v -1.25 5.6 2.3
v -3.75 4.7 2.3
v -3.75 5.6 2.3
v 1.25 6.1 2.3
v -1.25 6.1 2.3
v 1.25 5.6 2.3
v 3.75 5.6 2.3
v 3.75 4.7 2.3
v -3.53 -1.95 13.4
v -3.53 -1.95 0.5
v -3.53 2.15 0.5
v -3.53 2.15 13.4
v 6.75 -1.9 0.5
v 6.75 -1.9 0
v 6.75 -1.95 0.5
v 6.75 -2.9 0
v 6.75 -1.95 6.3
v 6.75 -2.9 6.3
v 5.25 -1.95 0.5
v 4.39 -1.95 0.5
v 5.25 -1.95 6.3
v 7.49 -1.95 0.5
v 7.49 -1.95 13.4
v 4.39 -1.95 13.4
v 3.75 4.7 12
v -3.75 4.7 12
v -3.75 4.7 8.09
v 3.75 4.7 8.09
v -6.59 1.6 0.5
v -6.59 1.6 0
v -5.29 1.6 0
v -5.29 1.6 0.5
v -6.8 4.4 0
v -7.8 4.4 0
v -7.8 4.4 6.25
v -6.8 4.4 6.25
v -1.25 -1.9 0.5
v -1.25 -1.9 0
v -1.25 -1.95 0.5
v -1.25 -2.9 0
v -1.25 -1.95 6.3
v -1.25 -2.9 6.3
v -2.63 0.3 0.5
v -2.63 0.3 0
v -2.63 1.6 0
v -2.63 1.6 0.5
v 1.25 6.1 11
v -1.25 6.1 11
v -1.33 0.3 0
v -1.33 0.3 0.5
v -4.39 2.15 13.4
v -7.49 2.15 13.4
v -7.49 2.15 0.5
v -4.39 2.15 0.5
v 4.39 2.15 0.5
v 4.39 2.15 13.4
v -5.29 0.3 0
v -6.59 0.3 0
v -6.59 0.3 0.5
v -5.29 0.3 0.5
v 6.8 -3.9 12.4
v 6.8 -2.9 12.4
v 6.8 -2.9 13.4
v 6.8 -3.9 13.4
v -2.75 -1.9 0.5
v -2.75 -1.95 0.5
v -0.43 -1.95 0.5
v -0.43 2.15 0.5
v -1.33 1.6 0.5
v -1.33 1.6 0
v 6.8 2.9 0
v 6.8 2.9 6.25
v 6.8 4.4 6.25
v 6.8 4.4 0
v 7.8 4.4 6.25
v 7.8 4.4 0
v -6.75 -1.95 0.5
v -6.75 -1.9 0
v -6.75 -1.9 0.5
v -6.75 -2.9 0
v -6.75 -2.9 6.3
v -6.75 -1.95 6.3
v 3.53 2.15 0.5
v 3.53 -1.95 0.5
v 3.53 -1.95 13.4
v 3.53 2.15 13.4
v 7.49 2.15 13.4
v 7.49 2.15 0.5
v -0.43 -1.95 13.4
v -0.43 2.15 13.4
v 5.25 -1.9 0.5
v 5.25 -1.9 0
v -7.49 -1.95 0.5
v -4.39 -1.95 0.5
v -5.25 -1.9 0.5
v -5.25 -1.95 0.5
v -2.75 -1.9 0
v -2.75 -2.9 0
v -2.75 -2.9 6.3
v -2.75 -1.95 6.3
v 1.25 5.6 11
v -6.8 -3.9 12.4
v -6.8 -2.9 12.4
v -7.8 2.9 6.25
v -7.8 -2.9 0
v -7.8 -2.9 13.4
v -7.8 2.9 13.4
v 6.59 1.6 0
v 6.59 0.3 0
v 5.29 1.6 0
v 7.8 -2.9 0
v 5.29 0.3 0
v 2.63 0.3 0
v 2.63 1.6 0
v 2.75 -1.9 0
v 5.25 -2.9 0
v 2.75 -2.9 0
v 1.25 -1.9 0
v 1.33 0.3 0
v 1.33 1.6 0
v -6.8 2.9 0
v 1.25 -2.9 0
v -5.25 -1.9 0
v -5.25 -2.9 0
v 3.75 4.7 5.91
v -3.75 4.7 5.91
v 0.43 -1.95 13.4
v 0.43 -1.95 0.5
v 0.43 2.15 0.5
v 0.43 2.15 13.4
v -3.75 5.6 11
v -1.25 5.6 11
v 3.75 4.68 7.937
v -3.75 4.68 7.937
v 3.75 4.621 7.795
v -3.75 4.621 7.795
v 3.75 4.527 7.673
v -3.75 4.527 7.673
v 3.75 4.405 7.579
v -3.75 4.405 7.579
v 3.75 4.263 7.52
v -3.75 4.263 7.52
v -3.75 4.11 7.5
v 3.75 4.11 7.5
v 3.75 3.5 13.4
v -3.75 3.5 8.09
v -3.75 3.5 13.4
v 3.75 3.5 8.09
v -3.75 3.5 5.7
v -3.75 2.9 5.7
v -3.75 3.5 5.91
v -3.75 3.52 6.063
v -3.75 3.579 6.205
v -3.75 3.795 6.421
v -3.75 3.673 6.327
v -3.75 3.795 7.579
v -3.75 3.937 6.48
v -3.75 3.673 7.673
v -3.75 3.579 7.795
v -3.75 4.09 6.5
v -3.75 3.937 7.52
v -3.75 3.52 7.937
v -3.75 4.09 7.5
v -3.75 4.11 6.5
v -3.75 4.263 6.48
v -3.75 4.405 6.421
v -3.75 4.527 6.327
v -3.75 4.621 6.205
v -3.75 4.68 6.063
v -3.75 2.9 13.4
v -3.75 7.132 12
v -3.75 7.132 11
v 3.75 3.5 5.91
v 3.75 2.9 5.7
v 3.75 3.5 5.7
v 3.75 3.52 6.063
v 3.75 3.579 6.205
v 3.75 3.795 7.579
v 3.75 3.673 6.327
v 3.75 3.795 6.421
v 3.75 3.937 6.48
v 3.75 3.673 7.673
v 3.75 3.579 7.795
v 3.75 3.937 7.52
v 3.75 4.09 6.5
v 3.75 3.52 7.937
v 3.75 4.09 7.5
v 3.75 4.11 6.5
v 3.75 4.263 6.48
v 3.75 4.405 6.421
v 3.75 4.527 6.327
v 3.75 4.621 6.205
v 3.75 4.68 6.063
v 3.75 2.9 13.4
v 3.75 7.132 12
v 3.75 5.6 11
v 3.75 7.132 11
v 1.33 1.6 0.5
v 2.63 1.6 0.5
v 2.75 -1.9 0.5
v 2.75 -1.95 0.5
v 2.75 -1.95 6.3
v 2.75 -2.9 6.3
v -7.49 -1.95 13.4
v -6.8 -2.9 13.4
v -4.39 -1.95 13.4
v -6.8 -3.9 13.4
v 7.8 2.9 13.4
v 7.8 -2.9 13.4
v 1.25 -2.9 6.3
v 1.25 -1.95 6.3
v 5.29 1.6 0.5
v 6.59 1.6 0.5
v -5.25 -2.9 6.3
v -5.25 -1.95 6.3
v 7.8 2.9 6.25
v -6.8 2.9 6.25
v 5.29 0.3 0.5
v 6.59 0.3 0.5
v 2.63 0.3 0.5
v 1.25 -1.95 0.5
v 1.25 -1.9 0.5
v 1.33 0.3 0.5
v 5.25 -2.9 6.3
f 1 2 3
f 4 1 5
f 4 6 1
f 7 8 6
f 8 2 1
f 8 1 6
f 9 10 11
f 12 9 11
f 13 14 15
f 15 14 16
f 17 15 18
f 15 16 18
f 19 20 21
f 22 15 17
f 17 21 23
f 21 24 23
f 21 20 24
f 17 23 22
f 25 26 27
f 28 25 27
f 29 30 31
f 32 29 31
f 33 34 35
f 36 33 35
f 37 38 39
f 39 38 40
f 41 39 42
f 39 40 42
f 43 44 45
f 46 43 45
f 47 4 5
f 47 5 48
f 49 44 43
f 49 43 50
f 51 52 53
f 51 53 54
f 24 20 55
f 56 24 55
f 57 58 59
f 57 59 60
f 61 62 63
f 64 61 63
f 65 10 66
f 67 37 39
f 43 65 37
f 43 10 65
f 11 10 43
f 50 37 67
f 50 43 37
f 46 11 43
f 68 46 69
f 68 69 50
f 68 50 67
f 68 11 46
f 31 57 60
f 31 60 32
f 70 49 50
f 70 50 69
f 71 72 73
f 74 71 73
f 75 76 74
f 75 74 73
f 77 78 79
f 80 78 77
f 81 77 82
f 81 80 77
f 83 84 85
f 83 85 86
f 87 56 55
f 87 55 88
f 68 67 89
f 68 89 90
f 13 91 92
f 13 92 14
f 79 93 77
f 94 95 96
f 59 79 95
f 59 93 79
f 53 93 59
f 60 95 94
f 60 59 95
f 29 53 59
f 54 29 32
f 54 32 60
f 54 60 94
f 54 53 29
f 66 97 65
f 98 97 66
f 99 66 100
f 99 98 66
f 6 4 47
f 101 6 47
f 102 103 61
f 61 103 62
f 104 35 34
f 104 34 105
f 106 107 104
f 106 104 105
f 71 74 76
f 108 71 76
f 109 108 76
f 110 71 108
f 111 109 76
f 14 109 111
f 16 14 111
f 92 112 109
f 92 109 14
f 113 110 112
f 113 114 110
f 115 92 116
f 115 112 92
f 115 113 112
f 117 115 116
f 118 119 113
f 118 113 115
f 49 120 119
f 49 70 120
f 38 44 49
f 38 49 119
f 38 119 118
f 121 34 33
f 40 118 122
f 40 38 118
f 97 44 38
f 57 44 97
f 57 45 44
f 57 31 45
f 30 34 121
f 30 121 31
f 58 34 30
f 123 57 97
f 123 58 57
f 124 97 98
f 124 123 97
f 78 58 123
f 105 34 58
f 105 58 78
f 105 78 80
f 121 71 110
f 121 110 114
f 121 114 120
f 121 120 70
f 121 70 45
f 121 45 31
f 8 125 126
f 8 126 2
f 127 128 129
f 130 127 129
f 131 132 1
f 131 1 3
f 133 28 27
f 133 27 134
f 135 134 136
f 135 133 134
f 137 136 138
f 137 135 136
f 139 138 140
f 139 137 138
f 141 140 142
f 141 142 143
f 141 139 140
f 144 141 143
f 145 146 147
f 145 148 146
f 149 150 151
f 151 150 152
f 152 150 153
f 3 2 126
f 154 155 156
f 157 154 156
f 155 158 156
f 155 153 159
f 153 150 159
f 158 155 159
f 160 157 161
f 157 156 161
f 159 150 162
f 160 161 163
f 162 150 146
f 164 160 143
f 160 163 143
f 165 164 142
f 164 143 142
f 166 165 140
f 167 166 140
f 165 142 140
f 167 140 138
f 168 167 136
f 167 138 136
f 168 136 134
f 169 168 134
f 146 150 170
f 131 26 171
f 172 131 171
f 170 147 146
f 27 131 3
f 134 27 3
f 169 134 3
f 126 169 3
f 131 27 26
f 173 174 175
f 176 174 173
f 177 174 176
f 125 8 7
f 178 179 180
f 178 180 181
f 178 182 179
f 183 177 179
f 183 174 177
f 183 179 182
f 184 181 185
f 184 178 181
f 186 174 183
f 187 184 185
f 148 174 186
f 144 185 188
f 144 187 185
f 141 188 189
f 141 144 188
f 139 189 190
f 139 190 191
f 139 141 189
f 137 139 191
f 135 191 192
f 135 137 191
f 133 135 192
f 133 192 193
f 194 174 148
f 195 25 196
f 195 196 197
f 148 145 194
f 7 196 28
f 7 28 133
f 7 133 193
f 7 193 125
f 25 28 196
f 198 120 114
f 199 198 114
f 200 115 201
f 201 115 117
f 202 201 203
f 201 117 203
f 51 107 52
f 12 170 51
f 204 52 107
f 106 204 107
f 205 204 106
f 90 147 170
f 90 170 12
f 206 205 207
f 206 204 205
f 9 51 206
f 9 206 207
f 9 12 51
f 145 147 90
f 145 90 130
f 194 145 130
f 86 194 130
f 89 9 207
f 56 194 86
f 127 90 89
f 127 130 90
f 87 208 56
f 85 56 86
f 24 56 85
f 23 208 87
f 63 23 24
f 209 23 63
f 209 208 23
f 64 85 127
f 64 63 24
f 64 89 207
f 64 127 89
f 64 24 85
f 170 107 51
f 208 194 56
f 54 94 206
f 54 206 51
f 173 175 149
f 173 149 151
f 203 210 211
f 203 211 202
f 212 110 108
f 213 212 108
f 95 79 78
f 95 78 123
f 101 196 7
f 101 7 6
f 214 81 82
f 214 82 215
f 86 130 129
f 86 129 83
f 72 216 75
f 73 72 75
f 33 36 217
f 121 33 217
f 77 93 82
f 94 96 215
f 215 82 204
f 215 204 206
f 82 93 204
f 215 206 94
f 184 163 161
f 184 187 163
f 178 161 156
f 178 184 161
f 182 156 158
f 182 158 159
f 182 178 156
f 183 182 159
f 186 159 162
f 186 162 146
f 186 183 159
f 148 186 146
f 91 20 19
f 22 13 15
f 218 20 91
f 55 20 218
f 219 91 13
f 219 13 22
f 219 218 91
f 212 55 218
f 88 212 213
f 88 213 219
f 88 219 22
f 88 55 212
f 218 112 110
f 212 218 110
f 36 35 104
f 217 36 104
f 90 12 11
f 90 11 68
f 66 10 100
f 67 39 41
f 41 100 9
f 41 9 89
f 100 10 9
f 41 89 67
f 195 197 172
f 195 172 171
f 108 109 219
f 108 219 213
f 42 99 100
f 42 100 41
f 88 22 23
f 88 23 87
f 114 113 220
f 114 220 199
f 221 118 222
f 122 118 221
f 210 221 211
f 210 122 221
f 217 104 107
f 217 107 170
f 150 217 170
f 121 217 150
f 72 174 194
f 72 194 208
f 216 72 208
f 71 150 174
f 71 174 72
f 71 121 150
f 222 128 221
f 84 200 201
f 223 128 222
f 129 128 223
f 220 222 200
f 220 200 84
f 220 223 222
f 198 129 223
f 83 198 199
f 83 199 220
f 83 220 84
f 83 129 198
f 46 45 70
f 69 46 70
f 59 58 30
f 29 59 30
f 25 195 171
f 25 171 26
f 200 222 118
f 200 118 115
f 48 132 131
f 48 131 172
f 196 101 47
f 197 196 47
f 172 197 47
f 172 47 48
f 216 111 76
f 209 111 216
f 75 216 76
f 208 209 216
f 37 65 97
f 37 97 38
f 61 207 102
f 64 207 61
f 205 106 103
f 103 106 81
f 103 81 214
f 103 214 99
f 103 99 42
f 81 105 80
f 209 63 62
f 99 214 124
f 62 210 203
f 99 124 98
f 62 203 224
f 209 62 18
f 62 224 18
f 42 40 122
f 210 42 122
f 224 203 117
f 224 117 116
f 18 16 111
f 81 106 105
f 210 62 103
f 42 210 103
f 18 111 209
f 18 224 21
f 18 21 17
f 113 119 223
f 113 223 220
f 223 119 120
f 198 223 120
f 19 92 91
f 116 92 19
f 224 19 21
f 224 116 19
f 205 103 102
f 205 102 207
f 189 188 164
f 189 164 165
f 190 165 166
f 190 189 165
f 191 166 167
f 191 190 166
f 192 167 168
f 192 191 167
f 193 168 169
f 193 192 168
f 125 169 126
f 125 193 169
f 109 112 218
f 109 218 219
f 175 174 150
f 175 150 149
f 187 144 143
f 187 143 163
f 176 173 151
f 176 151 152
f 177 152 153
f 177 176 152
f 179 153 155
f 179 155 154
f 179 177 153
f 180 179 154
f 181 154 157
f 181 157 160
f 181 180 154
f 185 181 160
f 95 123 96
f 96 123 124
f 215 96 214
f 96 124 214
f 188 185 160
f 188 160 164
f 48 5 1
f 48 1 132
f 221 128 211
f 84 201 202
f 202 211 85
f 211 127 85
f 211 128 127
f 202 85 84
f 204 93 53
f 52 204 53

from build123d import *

# Parameters (mm, degrees)
F0_W           = 15.6
F0_H           = 5.8
F1_DEPTH       = 13.4
F2_W           = 1.5
F2_H           = 6.25
F3_DEPTH       = 1
F4_W           = 1.5
F4_H           = 6.25
F5_DEPTH       = 1
F6_W           = 13.6
F6_H           = 1
F7_DEPTH       = 1
F8_W           = 1.5
F8_H           = 6.3
F9_DEPTH       = 1
F10_W          = 1.3
F10_H          = 1.3
F11_DEPTH      = 13.401
F12_W          = 3.1
F12_H          = 4.1
F12_W_2        = 1.3
F12_H_2        = 1.3
F13_DEPTH      = 12.9
F15_DEPTH      = 3.75
F15_DEPTH_BACK = 3.75
F16_W          = 2.5
F16_H          = 8.7
F17_DEPTH      = 0.5


with BuildPart() as f1:
    # F0 (on Top) → F1 (new body)
    with BuildSketch(Plane.XY):
        Rectangle(F0_W, F0_H)
    extrude(amount=F1_DEPTH)

    # F2 (on face) → F3 (join)
    with BuildSketch(Plane.YZ.offset(7.8)):
        with Locations((3.65, 3.125)):
            Rectangle(F2_W, F2_H)
    extrude(amount=-F3_DEPTH)

    # F4 (on face) → F5 (join)
    with BuildSketch(Plane(origin=(-7.8, 0, 0), x_dir=(0, -1, 0), z_dir=(-1, 0, 0))):
        with Locations((-3.65, 3.125)):
            Rectangle(F4_W, F4_H)
    extrude(amount=-F5_DEPTH)

    # F6 (on face) → F7 (join)
    with BuildSketch(Plane.XZ.offset(2.9)):
        with Locations((0, 12.9)):
            Rectangle(F6_W, F6_H)
    extrude(amount=F7_DEPTH)

    # F8 (on face) → F9 (cut)
    with BuildSketch(Plane.XZ.offset(2.9)):
        with Locations((-6, 3.15)):
            Rectangle(F8_W, F8_H)
        with Locations((-2, 3.15)):
            Rectangle(F8_W, F8_H)
        with Locations((2, 3.15)):
            Rectangle(F8_W, F8_H)
        with Locations((6, 3.15)):
            Rectangle(F8_W, F8_H)
    extrude(amount=-F9_DEPTH, mode=Mode.SUBTRACT)

    # F10 (on Top) → F11 (cut, through all)
    with BuildSketch(Plane.XY):
        with Locations((5.94, 0.95)):
            Rectangle(F10_W, F10_H)
        with Locations((1.98, 0.95)):
            Rectangle(F10_W, F10_H)
        with Locations((-1.98, 0.95)):
            Rectangle(F10_W, F10_H)
        with Locations((-5.94, 0.95)):
            Rectangle(F10_W, F10_H)
    extrude(amount=F11_DEPTH, mode=Mode.SUBTRACT)

    # F12 (on face) → F13 (cut)
    with BuildSketch(Plane.XY.offset(13.4)):
        with Locations((-5.94, 0.1)):
            Rectangle(F12_W, F12_H)
        with Locations((-5.94, 0.95)):
            Rectangle(F12_W_2, F12_H_2, mode=Mode.SUBTRACT)
        with Locations((-1.98, 0.1)):
            Rectangle(F12_W, F12_H)
        with Locations((-1.98, 0.95)):
            Rectangle(F12_W_2, F12_H_2, mode=Mode.SUBTRACT)
        with Locations((1.98, 0.1)):
            Rectangle(F12_W, F12_H)
        with Locations((1.98, 0.95)):
            Rectangle(F12_W_2, F12_H_2, mode=Mode.SUBTRACT)
        with Locations((5.94, 0.1)):
            Rectangle(F12_W, F12_H)
        with Locations((5.94, 0.95)):
            Rectangle(F12_W_2, F12_H_2, mode=Mode.SUBTRACT)
    extrude(amount=-F13_DEPTH, mode=Mode.SUBTRACT)

    # F14 (on Right) → F15 (join, two sides)
    with BuildSketch(Plane.YZ) as f15_sk:
        with BuildLine():
            Line((3.5, 13.4), (2.9, 13.4))
            Line((2.9, 13.4), (2.9, 5.7))
            Line((2.9, 5.7), (3.5, 5.7))
            Line((3.5, 5.7), (3.5, 5.91))
            ThreePointArc((3.5, 5.91), (3.672807, 6.327193), (4.09, 6.5))
            Line((4.09, 6.5), (4.11, 6.5))
            ThreePointArc((4.11, 6.5), (4.527193, 6.327193), (4.7, 5.91))
            Line((4.7, 5.91), (4.7, 2.3))
            Line((4.7, 2.3), (6.1, 2.3))
            Line((6.1, 2.3), (6.1, 11))
            Line((6.1, 11), (7.132015, 11))
            Line((7.132015, 11), (7.132015, 12))
            Line((7.132015, 12), (4.7, 12))
            Line((4.7, 12), (4.7, 8.09))
            ThreePointArc((4.7, 8.09), (4.527193, 7.672807), (4.11, 7.5))
            Line((4.11, 7.5), (4.09, 7.5))
            ThreePointArc((4.09, 7.5), (3.672807, 7.672807), (3.5, 8.09))
            Line((3.5, 8.09), (3.5, 13.4))
        make_face()
    extrude(amount=F15_DEPTH)
    extrude(f15_sk.sketch, amount=-F15_DEPTH_BACK)

    # F16 (on face) → F17 (cut)
    with BuildSketch(Plane(origin=(0, 6.1, 0), x_dir=(-1, 0, 0), z_dir=(0, 1, 0))):
        with Locations((-2.5, 6.65)):
            Rectangle(F16_W, F16_H)
        with Locations((2.5, 6.65)):
            Rectangle(F16_W, F16_H)
    extrude(amount=-F17_DEPTH, mode=Mode.SUBTRACT)


solid = f1.part
